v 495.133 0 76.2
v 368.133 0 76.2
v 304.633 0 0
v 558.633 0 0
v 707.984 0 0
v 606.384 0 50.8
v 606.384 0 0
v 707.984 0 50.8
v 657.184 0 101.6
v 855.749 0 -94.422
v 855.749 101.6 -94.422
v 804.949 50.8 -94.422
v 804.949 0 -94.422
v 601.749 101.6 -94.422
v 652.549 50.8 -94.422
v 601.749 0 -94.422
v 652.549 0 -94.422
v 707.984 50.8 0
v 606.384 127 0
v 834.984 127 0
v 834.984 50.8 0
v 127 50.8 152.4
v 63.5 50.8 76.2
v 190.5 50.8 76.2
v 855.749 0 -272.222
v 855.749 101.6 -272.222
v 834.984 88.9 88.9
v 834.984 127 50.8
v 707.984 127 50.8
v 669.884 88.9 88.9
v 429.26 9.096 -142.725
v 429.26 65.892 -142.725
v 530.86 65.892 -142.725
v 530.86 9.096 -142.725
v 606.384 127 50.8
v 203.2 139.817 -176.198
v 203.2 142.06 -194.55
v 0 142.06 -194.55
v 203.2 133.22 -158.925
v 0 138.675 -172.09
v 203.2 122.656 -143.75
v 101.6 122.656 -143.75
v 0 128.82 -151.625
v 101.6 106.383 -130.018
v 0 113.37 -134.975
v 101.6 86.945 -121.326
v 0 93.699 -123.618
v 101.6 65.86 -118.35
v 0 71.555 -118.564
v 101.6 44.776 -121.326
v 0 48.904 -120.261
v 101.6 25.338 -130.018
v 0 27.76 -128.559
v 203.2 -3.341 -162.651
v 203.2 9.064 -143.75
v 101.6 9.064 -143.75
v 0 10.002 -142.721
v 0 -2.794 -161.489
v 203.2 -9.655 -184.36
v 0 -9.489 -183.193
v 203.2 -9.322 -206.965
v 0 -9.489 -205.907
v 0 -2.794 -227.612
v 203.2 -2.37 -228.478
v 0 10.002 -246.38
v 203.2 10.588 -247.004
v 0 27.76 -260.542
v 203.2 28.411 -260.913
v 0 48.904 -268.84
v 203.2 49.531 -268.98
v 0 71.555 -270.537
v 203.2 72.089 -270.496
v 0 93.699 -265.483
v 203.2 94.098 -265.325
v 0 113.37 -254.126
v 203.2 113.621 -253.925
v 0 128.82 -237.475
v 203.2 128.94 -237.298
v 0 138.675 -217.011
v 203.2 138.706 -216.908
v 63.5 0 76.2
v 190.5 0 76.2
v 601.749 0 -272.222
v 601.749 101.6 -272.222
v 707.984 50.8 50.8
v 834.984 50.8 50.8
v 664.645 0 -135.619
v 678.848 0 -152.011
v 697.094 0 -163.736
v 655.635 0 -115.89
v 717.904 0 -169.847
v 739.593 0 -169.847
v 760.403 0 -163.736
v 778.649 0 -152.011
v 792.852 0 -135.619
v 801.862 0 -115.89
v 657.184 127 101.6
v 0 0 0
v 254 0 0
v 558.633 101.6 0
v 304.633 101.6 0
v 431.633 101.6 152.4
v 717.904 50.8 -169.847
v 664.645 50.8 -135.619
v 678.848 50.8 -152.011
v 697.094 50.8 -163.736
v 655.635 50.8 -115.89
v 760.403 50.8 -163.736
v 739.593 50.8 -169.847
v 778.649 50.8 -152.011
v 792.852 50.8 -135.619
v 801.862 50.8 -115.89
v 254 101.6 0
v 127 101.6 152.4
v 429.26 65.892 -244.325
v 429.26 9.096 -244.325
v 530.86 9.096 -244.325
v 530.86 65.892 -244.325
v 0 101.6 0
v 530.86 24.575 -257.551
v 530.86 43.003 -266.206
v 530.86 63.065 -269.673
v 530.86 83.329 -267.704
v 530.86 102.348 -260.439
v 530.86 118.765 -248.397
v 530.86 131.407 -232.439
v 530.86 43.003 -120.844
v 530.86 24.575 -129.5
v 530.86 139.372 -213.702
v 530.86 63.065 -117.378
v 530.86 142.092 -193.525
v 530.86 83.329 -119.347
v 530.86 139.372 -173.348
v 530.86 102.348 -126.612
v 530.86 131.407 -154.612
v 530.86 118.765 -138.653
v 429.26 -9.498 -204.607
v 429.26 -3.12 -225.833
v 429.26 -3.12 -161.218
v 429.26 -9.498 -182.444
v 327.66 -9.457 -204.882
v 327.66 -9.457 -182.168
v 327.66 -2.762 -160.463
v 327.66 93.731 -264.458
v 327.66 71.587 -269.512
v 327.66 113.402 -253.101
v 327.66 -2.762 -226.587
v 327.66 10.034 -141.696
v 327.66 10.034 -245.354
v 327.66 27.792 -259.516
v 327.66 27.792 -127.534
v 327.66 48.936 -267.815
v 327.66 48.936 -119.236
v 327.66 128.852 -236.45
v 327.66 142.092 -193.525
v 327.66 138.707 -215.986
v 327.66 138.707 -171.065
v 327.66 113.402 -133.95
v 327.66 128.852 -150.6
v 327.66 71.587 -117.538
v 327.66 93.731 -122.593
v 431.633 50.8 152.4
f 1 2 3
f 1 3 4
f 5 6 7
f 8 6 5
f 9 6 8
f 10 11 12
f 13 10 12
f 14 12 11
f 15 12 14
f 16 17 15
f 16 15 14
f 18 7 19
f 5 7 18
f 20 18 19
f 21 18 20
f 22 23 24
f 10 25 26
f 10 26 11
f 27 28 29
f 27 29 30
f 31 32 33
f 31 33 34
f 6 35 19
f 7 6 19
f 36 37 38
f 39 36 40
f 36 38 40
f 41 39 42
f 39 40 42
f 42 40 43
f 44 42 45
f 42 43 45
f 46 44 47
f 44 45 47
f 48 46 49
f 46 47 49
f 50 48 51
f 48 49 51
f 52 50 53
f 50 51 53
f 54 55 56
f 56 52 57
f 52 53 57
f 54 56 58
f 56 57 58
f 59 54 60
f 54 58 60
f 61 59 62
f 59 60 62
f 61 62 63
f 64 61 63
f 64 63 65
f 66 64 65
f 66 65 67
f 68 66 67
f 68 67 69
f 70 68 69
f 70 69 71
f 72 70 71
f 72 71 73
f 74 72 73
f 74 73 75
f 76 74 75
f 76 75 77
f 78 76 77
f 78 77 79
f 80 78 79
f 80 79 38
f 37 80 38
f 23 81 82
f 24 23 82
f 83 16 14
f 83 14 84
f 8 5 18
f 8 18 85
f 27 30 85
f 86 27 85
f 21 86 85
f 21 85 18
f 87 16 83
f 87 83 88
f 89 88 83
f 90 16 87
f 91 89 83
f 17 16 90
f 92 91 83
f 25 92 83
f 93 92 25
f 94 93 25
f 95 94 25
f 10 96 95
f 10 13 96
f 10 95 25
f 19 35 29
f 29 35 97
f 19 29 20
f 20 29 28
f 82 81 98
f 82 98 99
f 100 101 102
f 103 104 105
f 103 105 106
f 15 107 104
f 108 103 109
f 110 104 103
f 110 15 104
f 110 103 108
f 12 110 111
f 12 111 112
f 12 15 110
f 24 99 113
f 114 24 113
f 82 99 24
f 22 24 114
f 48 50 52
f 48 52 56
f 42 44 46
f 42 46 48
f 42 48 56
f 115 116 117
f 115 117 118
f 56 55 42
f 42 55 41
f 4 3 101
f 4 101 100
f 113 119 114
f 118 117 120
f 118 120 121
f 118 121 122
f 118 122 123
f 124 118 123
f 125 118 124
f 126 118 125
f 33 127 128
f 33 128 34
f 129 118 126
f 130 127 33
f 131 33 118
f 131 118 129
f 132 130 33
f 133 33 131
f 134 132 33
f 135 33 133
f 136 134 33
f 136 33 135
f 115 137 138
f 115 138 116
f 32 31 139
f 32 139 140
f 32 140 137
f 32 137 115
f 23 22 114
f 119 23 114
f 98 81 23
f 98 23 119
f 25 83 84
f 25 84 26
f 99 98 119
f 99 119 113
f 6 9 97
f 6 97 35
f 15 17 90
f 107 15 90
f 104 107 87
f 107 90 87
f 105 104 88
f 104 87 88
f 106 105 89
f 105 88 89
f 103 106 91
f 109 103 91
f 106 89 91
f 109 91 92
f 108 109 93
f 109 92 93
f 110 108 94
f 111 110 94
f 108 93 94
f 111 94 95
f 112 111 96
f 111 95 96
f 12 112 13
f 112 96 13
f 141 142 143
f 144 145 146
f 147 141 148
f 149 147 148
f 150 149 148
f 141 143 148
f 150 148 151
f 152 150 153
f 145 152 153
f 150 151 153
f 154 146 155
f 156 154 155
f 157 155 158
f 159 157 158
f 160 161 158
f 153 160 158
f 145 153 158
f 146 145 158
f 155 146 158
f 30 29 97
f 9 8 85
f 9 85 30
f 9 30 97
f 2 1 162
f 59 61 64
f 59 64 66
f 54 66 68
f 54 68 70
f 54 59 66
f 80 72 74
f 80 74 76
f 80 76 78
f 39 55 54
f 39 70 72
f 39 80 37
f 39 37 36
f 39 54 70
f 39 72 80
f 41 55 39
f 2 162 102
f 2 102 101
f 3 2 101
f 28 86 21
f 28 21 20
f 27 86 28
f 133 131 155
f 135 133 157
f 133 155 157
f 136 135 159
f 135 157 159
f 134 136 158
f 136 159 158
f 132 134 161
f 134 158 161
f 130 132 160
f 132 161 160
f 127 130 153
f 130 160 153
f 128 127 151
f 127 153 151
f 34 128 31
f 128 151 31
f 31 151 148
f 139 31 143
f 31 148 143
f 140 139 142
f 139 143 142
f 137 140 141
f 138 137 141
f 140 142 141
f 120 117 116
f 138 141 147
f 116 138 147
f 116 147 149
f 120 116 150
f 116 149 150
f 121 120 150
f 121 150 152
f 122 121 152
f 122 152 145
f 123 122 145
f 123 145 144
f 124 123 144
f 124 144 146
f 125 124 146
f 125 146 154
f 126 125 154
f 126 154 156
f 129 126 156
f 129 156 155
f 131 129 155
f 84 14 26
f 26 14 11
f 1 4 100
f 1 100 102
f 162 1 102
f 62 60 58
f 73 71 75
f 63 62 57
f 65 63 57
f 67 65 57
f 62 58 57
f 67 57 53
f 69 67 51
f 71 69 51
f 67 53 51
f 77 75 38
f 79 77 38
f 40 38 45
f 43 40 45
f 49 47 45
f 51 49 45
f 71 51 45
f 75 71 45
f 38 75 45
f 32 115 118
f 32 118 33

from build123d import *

# Parameters (mm, degrees)
F1_DEPTH  = 101.6
F3_DEPTH  = 50.8
F5_DEPTH  = 101.6
F9_DEPTH  = 63.5
F11_DEPTH = 127
F15_R     = 76.2
F16_DEPTH = 203.2
F18_DEPTH = 101.6
F20_R     = 76.2
F21_DEPTH = 203.2
F23_DEPTH = 101.6
F25_DEPTH = 101.6
F27_DEPTH = 50.8


with BuildPart() as f1:
    # F0 (on Front) → F1 (new body)
    with BuildSketch(Plane.XZ):
        Polygon((127, 152.4), (0, 0), (254, 0), align=None)
    extrude(amount=-F1_DEPTH)

    # F2 (on face) → F3 (cut)
    with BuildSketch(Plane.XZ):
        Polygon((63.5, 76.2), (127, 76.2), (190.5, 76.2), (127, 152.4), align=None)
    extrude(amount=-F3_DEPTH, mode=Mode.SUBTRACT)


with BuildPart() as f5:
    # F4 (on Front) → F5 (new body)
    with BuildSketch(Plane.XZ):
        Polygon((431.6333237171, 152.4), (304.6333237171, 0), (558.6333237171, 0), align=None)
    extrude(amount=-F5_DEPTH)

    # F8 (on 3pt) → F9 (cut, symmetric)
    with BuildSketch(Plane.YZ.offset(431.6333237171)):
        Polygon((50.8, 152.4), (0, 152.4), (0, 76.2), align=None)
    extrude(amount=F9_DEPTH, both=True, mode=Mode.SUBTRACT)


with BuildPart() as f11:
    # F10 (on Front) → F11 (new body)
    with BuildSketch(Plane.XZ):
        Polygon((606.3837154388, 50.8), (606.3837154388, 0), (657.1837154388, 0), (707.9837154388, 0), (707.9837154388, 50.8), (657.1837154388, 101.6), align=None)
    extrude(amount=-F11_DEPTH)

    # F13 (on offset) → F14 (join, up to the next surface of F11)
    with BuildSketch(Plane.YZ.offset(834.9837154388)):
        Polygon((88.9, 88.9), (50.8, 50.8), (50.8, 0), (127, 0), (127, 50.8), align=None)
    extrude(until=Until.NEXT, dir=(-1, 0, 0))


with BuildPart() as f16:
    # F15 (on Right) → F16 (new body)
    with BuildSketch(Plane.YZ):
        with Locations((65.8603087068, -194.5504695177)):
            Circle(F15_R)
    extrude(amount=F16_DEPTH)

    # F17 (on face) → F18 (cut)
    with BuildSketch(Plane.YZ.offset(203.2)):
        with BuildLine():
            Line((9.0641820783, -143.7504695177), (65.8603087068, -143.7504695177))
            Line((65.8603087068, -143.7504695177), (122.6564353353, -143.7504695177))
            ThreePointArc((122.6564353353, -143.7504695177), (65.8603087068, -118.3504695177), (9.0641820783, -143.7504695177))
        make_face()
    extrude(amount=-F18_DEPTH, mode=Mode.SUBTRACT)


with BuildPart() as f21:
    # F20 (on offset) → F21 (new body)
    with BuildSketch(Plane.YZ.offset(327.66)):
        with Locations((65.8921543072, -193.5252969361)):
            Circle(F20_R)
    extrude(amount=F21_DEPTH)

    # F22 (on face) → F23 (cut)
    with BuildSketch(Plane.YZ.offset(530.86)):
        with BuildLine():
            Line((65.8921543072, -244.3252969361), (65.8921543072, -142.7252969361))
            Line((65.8921543072, -142.7252969361), (9.0960276787, -142.7252969361))
            ThreePointArc((9.0960276787, -142.7252969361), (-10.3078456928, -193.5252969361), (9.0960276787, -244.3252969361))
            Line((9.0960276787, -244.3252969361), (65.8921543072, -244.3252969361))
        make_face()
    extrude(amount=-F23_DEPTH, mode=Mode.SUBTRACT)


with BuildPart() as f25:
    # F24 (on Front) → F25 (new body)
    with BuildSketch(Plane.XZ):
        Polygon((601.7486453056, -94.4223997116), (601.7486453056, -272.2223997116), (855.7486453056, -272.2223997116), (855.7486453056, -94.4223997116), (804.9486453056, -94.4223997116), (652.5486453056, -94.4223997116), align=None)
    extrude(amount=-F25_DEPTH)

    # F26 (on face) → F27 (cut)
    with BuildSketch(Plane.XZ):
        with BuildLine():
            Line((804.9486453056, -94.4223997116), (652.5486453056, -94.4223997116))
            ThreePointArc((652.5486453056, -94.4223997116), (728.7486453056, -170.6223997116), (804.9486453056, -94.4223997116))
        make_face()
    extrude(amount=-F27_DEPTH, mode=Mode.SUBTRACT)


solid = Compound([f1.part, f5.part, f11.part, f16.part, f21.part, f25.part])
